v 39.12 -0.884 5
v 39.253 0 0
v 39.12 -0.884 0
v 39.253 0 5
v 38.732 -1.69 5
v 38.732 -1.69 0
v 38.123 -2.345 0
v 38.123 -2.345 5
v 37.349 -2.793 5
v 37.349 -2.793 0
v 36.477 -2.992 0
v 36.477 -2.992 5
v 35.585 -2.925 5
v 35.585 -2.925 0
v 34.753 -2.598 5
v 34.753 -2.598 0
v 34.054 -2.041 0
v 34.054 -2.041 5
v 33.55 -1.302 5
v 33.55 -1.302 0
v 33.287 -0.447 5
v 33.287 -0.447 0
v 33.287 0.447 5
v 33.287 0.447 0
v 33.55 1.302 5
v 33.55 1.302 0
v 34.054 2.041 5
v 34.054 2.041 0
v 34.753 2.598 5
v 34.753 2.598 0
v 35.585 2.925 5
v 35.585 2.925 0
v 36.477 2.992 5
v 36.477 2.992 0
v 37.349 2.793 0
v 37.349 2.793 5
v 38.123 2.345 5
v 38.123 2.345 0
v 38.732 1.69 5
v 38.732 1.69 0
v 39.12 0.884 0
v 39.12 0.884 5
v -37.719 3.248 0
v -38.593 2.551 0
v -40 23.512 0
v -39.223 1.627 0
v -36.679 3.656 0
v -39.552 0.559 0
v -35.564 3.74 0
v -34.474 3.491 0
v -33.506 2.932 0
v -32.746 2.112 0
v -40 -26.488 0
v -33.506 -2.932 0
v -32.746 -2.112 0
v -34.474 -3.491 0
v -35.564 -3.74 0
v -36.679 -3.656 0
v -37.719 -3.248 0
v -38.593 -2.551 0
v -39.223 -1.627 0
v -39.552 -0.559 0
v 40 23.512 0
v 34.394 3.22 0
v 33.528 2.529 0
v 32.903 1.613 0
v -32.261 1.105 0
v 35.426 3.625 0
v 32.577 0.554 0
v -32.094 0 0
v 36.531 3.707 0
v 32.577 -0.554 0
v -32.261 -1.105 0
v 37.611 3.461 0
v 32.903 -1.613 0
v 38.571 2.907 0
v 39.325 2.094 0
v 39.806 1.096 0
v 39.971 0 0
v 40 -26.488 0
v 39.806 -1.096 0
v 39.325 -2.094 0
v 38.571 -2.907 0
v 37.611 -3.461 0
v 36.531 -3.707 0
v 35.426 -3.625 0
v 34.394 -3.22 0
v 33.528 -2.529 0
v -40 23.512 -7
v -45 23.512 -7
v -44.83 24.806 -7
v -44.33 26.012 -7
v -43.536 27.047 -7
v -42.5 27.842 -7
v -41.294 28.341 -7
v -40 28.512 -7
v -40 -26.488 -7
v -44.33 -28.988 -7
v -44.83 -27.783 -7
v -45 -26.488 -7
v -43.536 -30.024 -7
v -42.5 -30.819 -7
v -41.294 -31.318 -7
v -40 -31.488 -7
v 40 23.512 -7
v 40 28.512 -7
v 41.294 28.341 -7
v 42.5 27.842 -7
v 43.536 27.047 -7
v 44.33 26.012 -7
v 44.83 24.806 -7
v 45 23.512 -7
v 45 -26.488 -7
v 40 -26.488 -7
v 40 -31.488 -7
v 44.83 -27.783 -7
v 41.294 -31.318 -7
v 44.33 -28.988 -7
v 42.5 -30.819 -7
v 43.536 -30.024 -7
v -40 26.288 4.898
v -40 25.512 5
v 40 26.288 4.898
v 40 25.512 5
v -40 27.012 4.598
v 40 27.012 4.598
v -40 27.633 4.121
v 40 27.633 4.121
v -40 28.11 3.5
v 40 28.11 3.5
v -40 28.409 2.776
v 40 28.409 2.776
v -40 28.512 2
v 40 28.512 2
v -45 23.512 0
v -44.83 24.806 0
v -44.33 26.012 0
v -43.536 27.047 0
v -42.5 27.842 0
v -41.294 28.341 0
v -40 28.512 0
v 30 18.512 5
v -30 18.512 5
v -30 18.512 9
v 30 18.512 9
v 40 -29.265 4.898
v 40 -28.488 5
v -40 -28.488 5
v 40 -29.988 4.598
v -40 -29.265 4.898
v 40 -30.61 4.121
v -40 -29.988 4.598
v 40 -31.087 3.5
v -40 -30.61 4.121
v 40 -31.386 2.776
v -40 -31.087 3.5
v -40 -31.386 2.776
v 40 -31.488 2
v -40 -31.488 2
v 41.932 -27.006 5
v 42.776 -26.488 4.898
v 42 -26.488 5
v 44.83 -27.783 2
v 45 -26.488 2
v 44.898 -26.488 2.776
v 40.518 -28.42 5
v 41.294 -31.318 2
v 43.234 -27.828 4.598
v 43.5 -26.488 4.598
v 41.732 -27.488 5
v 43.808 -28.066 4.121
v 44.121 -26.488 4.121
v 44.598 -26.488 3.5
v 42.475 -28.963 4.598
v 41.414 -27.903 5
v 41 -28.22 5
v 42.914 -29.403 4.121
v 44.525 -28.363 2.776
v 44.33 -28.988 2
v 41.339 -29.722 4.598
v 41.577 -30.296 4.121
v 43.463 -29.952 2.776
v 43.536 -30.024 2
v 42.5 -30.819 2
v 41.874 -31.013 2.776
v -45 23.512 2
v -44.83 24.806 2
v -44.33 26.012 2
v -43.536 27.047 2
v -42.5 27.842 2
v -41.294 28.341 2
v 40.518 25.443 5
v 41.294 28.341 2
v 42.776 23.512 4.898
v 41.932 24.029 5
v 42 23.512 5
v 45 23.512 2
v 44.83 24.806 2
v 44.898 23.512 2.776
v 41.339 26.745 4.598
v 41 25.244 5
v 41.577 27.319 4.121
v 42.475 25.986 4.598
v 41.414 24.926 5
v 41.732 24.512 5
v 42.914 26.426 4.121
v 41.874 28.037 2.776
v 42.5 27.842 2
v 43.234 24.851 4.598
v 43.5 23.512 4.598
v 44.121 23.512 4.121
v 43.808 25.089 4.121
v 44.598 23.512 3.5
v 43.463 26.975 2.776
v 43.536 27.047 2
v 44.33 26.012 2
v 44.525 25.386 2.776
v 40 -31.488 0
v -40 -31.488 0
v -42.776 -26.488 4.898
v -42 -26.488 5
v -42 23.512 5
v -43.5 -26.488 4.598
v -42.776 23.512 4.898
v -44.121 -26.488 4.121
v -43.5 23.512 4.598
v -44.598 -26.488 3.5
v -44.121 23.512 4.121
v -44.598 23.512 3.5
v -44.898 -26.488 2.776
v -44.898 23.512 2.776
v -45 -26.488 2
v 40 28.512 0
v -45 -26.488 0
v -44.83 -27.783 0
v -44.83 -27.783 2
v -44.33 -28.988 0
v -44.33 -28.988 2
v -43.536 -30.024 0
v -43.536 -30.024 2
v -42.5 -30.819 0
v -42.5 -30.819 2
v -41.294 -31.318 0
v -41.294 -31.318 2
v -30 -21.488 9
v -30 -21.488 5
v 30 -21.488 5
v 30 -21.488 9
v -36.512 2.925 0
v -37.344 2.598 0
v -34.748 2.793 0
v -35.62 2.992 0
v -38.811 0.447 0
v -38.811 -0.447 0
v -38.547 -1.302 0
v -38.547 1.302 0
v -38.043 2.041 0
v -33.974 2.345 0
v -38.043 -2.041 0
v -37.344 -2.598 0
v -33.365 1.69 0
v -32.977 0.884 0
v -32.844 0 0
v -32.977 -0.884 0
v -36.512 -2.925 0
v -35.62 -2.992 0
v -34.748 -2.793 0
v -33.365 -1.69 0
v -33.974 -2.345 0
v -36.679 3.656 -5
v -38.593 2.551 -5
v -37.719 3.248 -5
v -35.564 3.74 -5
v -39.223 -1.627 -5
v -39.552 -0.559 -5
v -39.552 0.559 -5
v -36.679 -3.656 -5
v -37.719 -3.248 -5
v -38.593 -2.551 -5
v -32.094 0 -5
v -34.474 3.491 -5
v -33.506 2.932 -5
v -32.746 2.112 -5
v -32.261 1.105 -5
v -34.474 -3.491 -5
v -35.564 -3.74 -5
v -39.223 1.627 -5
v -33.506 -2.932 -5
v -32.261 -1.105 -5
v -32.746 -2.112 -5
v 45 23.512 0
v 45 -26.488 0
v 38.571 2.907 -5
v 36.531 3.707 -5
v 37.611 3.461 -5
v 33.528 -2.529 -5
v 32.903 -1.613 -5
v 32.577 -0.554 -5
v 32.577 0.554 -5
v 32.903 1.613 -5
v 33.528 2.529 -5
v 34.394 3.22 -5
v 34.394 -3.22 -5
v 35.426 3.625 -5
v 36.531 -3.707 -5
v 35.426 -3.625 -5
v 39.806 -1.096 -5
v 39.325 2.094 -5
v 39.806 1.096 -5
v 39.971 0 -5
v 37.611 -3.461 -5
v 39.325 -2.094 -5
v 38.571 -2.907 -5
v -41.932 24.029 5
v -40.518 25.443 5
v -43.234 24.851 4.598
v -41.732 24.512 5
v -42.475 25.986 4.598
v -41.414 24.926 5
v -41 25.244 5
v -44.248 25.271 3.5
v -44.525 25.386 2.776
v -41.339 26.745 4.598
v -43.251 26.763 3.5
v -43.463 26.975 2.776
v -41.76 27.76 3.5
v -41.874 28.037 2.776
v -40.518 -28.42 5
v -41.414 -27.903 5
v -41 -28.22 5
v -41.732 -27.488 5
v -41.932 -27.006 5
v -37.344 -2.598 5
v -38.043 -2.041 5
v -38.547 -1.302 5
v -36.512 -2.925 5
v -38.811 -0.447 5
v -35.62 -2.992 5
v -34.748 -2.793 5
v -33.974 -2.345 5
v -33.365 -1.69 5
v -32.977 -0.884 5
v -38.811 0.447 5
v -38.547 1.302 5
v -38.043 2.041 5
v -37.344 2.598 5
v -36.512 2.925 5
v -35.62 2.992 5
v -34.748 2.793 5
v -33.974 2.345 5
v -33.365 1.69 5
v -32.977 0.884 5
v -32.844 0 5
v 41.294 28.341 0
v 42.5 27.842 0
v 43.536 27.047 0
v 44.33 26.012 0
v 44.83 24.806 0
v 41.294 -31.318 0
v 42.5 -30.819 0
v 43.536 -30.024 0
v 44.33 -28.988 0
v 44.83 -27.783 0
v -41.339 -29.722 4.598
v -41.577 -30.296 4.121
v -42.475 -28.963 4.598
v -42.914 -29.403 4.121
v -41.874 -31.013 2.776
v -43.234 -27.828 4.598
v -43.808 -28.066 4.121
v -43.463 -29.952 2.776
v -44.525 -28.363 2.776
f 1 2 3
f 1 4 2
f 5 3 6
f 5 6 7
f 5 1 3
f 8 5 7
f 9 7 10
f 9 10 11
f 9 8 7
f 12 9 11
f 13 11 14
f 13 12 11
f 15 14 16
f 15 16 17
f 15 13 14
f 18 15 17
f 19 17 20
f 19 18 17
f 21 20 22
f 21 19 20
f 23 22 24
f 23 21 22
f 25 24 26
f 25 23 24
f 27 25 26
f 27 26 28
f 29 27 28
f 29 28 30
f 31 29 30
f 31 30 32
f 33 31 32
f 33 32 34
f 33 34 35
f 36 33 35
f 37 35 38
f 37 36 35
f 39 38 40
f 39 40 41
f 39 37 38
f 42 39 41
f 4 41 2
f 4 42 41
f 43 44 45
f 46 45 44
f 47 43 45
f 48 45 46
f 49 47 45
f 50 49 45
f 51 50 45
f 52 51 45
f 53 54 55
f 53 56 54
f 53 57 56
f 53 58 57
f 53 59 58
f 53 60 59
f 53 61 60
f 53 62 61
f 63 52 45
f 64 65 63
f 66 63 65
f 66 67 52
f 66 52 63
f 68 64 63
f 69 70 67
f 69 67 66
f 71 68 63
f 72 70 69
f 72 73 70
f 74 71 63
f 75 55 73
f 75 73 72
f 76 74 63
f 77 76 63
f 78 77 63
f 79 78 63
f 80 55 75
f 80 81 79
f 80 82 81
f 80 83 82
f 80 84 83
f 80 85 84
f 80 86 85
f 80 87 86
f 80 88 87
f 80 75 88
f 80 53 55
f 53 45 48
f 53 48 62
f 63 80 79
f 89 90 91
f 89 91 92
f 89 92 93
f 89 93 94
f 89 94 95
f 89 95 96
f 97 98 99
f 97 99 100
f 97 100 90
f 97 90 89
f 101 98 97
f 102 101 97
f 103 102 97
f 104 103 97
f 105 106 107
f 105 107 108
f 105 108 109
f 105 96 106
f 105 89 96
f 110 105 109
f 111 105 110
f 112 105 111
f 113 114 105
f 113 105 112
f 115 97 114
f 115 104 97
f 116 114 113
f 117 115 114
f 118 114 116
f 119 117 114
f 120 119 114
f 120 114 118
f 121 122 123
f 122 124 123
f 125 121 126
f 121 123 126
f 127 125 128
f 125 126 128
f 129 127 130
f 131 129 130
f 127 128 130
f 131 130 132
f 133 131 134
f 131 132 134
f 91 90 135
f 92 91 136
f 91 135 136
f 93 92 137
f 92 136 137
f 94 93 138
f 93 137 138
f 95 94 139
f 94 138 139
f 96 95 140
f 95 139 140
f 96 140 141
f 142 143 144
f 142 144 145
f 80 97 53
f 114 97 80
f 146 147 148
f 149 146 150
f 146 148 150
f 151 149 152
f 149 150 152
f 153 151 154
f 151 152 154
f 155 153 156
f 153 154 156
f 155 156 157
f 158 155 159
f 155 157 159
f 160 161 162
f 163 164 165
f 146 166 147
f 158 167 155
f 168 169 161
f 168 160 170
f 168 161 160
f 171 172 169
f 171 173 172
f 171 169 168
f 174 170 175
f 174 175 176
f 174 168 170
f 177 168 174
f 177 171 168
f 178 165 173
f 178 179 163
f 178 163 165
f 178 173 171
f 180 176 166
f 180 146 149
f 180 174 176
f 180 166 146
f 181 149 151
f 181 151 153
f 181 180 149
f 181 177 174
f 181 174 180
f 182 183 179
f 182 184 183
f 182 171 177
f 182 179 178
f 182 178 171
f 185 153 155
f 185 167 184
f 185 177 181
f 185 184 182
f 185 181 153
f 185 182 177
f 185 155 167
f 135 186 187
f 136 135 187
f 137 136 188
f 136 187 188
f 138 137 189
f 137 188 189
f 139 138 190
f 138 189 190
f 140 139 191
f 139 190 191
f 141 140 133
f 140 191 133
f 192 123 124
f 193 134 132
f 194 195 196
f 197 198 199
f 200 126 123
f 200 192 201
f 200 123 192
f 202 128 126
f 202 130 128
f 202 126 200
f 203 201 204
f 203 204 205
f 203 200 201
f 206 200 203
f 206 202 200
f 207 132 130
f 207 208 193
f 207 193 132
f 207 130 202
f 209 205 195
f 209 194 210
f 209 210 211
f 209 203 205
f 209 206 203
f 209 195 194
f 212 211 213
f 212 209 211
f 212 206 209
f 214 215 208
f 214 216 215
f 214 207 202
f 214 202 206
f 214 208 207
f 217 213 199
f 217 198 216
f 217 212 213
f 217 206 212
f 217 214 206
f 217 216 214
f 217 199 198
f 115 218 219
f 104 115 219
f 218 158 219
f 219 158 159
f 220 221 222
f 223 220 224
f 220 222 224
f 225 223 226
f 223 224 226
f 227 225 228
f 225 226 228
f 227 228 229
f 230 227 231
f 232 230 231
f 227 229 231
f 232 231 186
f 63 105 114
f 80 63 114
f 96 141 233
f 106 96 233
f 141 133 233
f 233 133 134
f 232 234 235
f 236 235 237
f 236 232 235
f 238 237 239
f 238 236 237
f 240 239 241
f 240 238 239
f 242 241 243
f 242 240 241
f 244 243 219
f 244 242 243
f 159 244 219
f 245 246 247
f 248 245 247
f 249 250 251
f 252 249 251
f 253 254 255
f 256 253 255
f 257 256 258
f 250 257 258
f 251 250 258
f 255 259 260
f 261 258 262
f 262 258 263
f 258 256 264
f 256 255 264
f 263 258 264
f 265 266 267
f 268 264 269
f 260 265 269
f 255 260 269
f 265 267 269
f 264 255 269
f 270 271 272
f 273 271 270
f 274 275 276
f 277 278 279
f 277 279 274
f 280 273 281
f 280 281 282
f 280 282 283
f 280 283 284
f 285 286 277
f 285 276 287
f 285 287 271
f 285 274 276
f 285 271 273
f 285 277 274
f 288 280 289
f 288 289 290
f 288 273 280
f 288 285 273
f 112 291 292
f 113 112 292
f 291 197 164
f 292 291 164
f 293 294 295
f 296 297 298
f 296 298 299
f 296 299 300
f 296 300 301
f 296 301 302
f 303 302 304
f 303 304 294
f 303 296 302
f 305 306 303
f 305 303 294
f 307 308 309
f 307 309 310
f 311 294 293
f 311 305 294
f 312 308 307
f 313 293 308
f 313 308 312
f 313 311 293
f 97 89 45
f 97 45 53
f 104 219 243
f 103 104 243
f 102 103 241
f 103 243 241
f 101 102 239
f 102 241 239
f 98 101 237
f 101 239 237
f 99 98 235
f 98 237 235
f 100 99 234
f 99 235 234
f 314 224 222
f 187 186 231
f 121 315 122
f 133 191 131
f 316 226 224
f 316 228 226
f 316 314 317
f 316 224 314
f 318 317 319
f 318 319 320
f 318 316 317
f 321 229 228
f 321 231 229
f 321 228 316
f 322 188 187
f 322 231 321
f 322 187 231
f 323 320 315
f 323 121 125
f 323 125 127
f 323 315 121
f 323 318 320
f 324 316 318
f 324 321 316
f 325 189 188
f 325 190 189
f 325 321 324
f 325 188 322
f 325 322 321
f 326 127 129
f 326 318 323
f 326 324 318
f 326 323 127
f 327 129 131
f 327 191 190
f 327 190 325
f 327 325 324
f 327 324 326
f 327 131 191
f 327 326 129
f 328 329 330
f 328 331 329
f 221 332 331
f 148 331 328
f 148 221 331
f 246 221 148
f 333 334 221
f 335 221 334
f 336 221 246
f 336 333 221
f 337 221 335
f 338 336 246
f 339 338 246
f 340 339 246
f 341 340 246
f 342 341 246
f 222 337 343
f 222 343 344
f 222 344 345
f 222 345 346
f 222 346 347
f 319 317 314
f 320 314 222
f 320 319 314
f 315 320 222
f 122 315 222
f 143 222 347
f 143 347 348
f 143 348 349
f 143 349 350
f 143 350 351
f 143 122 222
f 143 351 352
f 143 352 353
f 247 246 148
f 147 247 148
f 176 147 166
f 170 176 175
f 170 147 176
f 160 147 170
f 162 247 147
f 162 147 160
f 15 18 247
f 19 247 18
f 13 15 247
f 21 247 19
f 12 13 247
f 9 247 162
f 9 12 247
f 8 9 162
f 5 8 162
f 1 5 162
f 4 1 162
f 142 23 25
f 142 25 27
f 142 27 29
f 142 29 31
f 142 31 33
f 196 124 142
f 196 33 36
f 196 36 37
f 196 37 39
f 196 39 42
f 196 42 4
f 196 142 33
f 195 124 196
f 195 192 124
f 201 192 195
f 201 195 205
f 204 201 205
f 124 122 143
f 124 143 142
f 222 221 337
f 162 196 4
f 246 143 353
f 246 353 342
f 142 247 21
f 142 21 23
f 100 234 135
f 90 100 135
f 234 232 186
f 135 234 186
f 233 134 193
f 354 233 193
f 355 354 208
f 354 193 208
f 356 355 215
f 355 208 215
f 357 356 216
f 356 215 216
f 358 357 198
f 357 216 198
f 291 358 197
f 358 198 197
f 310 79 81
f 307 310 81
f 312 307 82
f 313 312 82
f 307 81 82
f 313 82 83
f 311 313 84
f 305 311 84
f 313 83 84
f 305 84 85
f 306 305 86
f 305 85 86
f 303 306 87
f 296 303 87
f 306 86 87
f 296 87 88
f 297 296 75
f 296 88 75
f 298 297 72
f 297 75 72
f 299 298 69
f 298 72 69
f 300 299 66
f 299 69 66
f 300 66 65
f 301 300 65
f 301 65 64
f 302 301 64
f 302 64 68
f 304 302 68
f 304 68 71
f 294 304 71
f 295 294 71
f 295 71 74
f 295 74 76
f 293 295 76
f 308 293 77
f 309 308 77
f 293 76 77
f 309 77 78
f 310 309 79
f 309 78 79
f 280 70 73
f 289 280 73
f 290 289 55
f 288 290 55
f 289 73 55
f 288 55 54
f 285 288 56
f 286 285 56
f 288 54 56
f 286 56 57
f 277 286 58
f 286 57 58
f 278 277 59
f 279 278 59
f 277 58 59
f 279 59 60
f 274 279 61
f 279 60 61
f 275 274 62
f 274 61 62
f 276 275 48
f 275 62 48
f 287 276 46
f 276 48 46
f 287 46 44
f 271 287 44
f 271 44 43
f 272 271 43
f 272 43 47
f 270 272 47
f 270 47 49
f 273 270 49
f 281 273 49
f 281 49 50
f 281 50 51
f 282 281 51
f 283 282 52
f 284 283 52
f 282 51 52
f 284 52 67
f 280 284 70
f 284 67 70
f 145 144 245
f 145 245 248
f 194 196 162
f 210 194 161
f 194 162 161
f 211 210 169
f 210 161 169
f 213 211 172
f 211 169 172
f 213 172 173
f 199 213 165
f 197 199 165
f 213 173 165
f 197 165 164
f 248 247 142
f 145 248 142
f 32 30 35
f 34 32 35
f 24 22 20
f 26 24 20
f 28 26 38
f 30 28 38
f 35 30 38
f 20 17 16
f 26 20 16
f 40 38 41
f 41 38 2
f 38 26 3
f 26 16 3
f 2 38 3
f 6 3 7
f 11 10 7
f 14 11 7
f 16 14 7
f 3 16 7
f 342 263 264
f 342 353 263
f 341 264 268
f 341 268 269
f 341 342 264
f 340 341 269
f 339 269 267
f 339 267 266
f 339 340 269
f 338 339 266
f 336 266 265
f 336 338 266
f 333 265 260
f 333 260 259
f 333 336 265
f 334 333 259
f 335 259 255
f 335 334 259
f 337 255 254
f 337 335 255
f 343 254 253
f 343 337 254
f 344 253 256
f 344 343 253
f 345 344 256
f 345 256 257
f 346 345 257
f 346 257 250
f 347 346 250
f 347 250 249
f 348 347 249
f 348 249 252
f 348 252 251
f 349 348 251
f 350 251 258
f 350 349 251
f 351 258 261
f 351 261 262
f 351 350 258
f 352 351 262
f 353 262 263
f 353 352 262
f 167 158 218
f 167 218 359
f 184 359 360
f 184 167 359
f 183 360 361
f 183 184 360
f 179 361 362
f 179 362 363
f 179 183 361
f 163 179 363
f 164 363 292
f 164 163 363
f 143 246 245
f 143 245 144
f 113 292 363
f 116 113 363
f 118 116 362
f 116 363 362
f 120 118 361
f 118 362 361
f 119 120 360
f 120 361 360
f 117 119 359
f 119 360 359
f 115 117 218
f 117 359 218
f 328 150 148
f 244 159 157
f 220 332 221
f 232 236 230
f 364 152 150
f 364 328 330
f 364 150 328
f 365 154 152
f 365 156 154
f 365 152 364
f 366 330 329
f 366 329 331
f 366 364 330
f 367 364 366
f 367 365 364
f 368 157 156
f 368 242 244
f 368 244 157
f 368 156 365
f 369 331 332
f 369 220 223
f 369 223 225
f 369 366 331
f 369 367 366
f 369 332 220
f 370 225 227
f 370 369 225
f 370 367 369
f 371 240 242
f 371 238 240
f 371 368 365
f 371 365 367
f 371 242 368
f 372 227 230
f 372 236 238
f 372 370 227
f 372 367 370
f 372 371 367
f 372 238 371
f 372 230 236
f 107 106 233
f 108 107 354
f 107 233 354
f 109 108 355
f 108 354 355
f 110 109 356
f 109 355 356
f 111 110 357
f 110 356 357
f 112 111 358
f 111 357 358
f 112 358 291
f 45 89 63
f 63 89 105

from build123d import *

# Parameters (mm, degrees)
F0_W      = 90
F0_H      = 60
F1_DEPTH  = 5
F2_W      = 60
F2_H      = 40
F3_DEPTH  = 4
F4_R      = 5
F5_R      = 3
F7_R      = 3
F8_DEPTH  = 10
F9_R      = 3
F10_DEPTH = 7
F11_W     = 80
F11_H     = 50
F11_R     = 3
F12_DEPTH = 7
F13_R     = 3.75
F14_DEPTH = 5
F15_R     = 3.7177308685
F16_DEPTH = 5


with BuildPart() as f1:
    # F0 (on Top) → F1 (new body)
    with BuildSketch(Plane.XY):
        with Locations((0, -1.4884271659)):
            Rectangle(F0_W, F0_H)
    extrude(amount=F1_DEPTH)

    # F2 (on face) → F3 (join)
    with BuildSketch(Plane.XY.offset(5)):
        with Locations((0, -1.4884271659)):
            Rectangle(F2_W, F2_H)
    extrude(amount=F3_DEPTH)

    # F4
    f4_edges = [f1.edges().sort_by_distance(p)[0] for p in [
        (-45, 28.511573, 2.5),
        (45, 28.511573, 2.5),
        (45, -31.488427, 2.5),
        (-45, -31.488427, 2.5),
    ]]
    fillet(f4_edges, radius=F4_R)

    # F5
    f5_edges = [f1.edges().sort_by_distance(p)[0] for p in [
        (0, 28.511573, 5),
    ]]
    fillet(f5_edges, radius=F5_R)

    # F7 (on Top) → F8 (cut)
    with BuildSketch(Plane.XY):
        with Locations((-35.8441621065, 0)):
            Circle(F7_R)
        with Locations((36.2529978156, 0)):
            Circle(F7_R)
    extrude(amount=F8_DEPTH, mode=Mode.SUBTRACT)

    # F9 (on face) → F10 (join)
    with BuildSketch(Plane(origin=(0, 0, 0), x_dir=(1, 0, 0), z_dir=(0, 0, -1))):
        with BuildLine():
            ThreePointArc((40, -28.5115728341), (43.5355339059, -27.04710674), (45, -23.5115728341))
            Line((45, -23.5115728341), (45, 26.4884271659))
            ThreePointArc((45, 26.4884271659), (43.5355339059, 30.0239610718), (40, 31.4884271659))
            Line((40, 31.4884271659), (-40, 31.4884271659))
            ThreePointArc((-40, 31.4884271659), (-43.5355339059, 30.0239610718), (-45, 26.4884271659))
            Line((-45, 26.4884271659), (-45, -23.5115728341))
            ThreePointArc((-45, -23.5115728341), (-43.5355339059, -27.04710674), (-40, -28.5115728341))
            Line((-40, -28.5115728341), (40, -28.5115728341))
        make_face()
        with Locations((-35.8441621065, 0)):
            Circle(F9_R, mode=Mode.SUBTRACT)
        with Locations((36.2529978156, 0)):
            Circle(F9_R, mode=Mode.SUBTRACT)
    extrude(amount=F10_DEPTH)

    # F11 (on face) → F12 (cut)
    with BuildSketch(Plane(origin=(0, 0, -7), x_dir=(1, 0, 0), z_dir=(0, 0, -1))):
        with Locations((0, 1.4884271659)):
            Rectangle(F11_W, F11_H)
        with Locations((-35.8441621065, 0)):
            Circle(F11_R, mode=Mode.SUBTRACT)
        with Locations((36.2529978156, 0)):
            Circle(F11_R, mode=Mode.SUBTRACT)
    extrude(amount=-F12_DEPTH, mode=Mode.SUBTRACT)

    # F13 (on face) → F14 (join)
    with BuildSketch(Plane(origin=(0, 0, 0), x_dir=(1, 0, 0), z_dir=(0, 0, -1))):
        with Locations((-35.8441621065, 0)):
            Circle(F13_R)
    extrude(amount=F14_DEPTH)

    # F15 (on face) → F16 (join)
    with BuildSketch(Plane(origin=(0, 0, 0), x_dir=(1, 0, 0), z_dir=(0, 0, -1))):
        with Locations((36.2529978156, 0)):
            Circle(F15_R)
    extrude(amount=F16_DEPTH)


solid = f1.part
